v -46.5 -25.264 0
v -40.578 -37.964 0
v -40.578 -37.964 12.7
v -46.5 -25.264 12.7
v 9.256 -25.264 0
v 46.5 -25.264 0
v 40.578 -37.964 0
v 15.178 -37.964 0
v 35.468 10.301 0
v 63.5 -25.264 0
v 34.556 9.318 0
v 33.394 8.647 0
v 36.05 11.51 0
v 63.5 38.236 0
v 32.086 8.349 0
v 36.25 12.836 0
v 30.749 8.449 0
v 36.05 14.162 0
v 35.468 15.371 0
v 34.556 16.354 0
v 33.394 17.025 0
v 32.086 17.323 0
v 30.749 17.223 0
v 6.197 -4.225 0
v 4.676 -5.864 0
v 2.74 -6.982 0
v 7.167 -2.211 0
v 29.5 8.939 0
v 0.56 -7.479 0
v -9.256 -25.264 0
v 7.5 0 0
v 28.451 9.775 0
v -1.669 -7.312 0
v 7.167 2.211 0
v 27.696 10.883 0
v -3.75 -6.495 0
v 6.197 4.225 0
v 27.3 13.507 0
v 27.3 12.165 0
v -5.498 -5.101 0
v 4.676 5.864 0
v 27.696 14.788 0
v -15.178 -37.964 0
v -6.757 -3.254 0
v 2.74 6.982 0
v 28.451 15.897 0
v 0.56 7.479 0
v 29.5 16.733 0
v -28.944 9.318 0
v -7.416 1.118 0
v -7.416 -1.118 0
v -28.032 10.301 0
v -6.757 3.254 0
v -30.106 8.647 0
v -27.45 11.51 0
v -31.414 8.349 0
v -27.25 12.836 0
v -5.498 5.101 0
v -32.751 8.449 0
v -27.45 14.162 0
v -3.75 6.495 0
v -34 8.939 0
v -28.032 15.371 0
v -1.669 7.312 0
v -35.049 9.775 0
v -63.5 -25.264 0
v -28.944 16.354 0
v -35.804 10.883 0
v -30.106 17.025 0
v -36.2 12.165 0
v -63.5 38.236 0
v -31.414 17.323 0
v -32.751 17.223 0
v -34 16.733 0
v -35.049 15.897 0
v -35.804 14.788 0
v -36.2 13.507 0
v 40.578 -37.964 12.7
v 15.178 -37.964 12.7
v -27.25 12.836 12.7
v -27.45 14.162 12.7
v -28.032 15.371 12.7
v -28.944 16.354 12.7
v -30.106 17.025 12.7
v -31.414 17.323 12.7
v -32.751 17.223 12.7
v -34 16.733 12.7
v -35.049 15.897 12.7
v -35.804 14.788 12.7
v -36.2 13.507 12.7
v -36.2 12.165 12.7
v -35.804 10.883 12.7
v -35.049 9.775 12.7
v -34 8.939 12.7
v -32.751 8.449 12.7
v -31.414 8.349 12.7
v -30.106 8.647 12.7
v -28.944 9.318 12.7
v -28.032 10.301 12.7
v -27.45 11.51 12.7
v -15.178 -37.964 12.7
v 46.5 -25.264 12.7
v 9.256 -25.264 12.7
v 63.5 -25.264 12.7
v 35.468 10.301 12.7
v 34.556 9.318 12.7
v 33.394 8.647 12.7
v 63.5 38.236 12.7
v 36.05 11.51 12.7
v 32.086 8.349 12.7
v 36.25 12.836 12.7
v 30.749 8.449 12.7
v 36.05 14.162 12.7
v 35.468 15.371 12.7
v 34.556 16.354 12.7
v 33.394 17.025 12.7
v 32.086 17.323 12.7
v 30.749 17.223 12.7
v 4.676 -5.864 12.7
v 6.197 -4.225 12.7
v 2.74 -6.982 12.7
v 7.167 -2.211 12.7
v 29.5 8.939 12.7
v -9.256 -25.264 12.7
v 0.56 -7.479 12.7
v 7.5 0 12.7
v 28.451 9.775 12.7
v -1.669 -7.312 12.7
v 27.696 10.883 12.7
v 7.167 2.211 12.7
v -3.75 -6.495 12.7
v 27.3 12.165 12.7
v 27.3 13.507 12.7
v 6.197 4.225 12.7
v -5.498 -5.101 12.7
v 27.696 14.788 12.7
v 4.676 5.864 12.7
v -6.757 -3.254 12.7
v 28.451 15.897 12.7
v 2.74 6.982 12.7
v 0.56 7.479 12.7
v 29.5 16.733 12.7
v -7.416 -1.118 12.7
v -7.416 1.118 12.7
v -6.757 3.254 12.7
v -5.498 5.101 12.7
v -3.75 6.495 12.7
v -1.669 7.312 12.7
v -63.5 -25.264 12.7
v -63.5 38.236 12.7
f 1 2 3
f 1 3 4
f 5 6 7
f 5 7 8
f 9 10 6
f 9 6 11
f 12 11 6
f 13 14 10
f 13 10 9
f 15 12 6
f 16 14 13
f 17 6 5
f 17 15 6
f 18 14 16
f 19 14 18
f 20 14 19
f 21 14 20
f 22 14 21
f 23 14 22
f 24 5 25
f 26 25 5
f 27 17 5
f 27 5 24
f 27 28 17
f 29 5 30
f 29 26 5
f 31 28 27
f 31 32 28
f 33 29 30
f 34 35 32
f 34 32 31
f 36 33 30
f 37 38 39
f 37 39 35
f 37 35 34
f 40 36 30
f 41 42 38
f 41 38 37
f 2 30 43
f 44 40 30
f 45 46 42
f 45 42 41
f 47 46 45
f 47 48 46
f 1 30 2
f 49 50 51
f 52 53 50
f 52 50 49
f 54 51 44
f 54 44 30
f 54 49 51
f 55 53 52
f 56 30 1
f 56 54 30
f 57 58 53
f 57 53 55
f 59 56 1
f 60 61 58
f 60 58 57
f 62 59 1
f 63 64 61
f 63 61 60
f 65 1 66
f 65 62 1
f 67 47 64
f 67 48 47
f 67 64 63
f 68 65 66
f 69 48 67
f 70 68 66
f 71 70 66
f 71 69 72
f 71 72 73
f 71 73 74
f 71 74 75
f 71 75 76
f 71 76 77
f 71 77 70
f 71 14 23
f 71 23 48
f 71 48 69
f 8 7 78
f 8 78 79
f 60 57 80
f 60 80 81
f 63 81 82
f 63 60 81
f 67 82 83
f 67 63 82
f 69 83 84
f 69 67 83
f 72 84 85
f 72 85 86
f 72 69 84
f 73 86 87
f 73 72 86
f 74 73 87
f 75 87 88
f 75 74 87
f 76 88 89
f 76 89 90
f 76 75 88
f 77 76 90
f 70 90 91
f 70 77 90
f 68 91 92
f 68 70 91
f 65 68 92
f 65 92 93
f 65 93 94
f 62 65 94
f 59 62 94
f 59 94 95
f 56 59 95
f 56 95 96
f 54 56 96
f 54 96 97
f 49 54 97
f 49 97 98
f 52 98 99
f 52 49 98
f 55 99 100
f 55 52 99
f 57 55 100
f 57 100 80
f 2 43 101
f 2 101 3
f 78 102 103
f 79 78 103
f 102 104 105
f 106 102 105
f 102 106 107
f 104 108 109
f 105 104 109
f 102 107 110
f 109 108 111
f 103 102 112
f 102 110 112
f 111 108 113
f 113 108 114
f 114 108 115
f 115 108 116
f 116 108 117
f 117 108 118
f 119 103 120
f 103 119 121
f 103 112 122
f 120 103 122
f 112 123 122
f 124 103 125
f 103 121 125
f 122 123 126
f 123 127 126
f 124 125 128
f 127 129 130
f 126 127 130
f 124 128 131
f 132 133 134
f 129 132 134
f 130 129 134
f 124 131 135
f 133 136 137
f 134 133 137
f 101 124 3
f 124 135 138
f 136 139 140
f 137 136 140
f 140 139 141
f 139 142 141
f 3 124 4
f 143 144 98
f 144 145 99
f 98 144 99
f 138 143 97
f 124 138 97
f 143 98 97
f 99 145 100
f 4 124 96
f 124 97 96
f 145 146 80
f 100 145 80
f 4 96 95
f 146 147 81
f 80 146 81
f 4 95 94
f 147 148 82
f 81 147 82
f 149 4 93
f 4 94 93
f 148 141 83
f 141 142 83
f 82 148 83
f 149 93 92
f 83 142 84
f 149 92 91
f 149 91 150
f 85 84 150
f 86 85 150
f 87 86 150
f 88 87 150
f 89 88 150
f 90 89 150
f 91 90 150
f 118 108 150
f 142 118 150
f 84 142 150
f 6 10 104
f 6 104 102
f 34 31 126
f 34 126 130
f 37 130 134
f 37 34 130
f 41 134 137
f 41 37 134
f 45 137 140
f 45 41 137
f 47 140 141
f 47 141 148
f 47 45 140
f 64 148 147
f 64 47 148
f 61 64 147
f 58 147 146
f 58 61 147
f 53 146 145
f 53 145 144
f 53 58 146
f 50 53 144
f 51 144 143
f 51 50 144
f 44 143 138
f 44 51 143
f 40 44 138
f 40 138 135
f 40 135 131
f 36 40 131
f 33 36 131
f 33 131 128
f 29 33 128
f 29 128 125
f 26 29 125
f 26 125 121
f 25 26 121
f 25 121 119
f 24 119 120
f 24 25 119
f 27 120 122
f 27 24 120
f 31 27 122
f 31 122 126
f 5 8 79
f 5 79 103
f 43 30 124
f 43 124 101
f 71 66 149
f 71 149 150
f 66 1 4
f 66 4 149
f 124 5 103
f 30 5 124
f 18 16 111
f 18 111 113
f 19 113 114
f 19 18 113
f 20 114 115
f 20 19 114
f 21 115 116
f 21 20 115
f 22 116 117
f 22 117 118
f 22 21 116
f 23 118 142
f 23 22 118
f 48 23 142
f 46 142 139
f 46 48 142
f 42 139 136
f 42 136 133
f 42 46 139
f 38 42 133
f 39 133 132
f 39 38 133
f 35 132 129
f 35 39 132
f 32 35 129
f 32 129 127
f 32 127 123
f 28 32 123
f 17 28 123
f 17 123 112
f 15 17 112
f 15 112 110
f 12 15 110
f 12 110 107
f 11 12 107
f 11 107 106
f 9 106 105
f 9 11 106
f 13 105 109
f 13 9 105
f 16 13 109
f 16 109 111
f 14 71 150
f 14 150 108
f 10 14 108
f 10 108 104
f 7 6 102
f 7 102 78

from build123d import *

# Parameters (mm, degrees)
SKETCH1_R           = 7.5
SKETCH1_R_2         = 4.5
BOSS_EXTRUDE1_DEPTH = 12.7


with BuildPart() as part:
    # Sketch1 → Boss-Extrude1 (new body)
    with BuildSketch(Plane.XY):
        Polygon((46.5, -25.264079911), (40.577892741, -37.964079911), (15.177892741, -37.964079911), (9.255785483, -25.264079911), (-9.255785483, -25.264079911), (-15.177892741, -37.964079911), (-40.577892741, -37.964079911), (-46.5, -25.264079911), (-63.5, -25.264079911), (-63.5, 38.235920089), (63.5, 38.235920089), (63.5, -25.264079911), align=None)
        Circle(SKETCH1_R, mode=Mode.SUBTRACT)
        with Locations((31.75, 12.835920089)):
            Circle(SKETCH1_R_2, mode=Mode.SUBTRACT)
        with Locations((-31.75, 12.835920089)):
            Circle(SKETCH1_R_2, mode=Mode.SUBTRACT)
    extrude(amount=BOSS_EXTRUDE1_DEPTH)


solid = part.part
